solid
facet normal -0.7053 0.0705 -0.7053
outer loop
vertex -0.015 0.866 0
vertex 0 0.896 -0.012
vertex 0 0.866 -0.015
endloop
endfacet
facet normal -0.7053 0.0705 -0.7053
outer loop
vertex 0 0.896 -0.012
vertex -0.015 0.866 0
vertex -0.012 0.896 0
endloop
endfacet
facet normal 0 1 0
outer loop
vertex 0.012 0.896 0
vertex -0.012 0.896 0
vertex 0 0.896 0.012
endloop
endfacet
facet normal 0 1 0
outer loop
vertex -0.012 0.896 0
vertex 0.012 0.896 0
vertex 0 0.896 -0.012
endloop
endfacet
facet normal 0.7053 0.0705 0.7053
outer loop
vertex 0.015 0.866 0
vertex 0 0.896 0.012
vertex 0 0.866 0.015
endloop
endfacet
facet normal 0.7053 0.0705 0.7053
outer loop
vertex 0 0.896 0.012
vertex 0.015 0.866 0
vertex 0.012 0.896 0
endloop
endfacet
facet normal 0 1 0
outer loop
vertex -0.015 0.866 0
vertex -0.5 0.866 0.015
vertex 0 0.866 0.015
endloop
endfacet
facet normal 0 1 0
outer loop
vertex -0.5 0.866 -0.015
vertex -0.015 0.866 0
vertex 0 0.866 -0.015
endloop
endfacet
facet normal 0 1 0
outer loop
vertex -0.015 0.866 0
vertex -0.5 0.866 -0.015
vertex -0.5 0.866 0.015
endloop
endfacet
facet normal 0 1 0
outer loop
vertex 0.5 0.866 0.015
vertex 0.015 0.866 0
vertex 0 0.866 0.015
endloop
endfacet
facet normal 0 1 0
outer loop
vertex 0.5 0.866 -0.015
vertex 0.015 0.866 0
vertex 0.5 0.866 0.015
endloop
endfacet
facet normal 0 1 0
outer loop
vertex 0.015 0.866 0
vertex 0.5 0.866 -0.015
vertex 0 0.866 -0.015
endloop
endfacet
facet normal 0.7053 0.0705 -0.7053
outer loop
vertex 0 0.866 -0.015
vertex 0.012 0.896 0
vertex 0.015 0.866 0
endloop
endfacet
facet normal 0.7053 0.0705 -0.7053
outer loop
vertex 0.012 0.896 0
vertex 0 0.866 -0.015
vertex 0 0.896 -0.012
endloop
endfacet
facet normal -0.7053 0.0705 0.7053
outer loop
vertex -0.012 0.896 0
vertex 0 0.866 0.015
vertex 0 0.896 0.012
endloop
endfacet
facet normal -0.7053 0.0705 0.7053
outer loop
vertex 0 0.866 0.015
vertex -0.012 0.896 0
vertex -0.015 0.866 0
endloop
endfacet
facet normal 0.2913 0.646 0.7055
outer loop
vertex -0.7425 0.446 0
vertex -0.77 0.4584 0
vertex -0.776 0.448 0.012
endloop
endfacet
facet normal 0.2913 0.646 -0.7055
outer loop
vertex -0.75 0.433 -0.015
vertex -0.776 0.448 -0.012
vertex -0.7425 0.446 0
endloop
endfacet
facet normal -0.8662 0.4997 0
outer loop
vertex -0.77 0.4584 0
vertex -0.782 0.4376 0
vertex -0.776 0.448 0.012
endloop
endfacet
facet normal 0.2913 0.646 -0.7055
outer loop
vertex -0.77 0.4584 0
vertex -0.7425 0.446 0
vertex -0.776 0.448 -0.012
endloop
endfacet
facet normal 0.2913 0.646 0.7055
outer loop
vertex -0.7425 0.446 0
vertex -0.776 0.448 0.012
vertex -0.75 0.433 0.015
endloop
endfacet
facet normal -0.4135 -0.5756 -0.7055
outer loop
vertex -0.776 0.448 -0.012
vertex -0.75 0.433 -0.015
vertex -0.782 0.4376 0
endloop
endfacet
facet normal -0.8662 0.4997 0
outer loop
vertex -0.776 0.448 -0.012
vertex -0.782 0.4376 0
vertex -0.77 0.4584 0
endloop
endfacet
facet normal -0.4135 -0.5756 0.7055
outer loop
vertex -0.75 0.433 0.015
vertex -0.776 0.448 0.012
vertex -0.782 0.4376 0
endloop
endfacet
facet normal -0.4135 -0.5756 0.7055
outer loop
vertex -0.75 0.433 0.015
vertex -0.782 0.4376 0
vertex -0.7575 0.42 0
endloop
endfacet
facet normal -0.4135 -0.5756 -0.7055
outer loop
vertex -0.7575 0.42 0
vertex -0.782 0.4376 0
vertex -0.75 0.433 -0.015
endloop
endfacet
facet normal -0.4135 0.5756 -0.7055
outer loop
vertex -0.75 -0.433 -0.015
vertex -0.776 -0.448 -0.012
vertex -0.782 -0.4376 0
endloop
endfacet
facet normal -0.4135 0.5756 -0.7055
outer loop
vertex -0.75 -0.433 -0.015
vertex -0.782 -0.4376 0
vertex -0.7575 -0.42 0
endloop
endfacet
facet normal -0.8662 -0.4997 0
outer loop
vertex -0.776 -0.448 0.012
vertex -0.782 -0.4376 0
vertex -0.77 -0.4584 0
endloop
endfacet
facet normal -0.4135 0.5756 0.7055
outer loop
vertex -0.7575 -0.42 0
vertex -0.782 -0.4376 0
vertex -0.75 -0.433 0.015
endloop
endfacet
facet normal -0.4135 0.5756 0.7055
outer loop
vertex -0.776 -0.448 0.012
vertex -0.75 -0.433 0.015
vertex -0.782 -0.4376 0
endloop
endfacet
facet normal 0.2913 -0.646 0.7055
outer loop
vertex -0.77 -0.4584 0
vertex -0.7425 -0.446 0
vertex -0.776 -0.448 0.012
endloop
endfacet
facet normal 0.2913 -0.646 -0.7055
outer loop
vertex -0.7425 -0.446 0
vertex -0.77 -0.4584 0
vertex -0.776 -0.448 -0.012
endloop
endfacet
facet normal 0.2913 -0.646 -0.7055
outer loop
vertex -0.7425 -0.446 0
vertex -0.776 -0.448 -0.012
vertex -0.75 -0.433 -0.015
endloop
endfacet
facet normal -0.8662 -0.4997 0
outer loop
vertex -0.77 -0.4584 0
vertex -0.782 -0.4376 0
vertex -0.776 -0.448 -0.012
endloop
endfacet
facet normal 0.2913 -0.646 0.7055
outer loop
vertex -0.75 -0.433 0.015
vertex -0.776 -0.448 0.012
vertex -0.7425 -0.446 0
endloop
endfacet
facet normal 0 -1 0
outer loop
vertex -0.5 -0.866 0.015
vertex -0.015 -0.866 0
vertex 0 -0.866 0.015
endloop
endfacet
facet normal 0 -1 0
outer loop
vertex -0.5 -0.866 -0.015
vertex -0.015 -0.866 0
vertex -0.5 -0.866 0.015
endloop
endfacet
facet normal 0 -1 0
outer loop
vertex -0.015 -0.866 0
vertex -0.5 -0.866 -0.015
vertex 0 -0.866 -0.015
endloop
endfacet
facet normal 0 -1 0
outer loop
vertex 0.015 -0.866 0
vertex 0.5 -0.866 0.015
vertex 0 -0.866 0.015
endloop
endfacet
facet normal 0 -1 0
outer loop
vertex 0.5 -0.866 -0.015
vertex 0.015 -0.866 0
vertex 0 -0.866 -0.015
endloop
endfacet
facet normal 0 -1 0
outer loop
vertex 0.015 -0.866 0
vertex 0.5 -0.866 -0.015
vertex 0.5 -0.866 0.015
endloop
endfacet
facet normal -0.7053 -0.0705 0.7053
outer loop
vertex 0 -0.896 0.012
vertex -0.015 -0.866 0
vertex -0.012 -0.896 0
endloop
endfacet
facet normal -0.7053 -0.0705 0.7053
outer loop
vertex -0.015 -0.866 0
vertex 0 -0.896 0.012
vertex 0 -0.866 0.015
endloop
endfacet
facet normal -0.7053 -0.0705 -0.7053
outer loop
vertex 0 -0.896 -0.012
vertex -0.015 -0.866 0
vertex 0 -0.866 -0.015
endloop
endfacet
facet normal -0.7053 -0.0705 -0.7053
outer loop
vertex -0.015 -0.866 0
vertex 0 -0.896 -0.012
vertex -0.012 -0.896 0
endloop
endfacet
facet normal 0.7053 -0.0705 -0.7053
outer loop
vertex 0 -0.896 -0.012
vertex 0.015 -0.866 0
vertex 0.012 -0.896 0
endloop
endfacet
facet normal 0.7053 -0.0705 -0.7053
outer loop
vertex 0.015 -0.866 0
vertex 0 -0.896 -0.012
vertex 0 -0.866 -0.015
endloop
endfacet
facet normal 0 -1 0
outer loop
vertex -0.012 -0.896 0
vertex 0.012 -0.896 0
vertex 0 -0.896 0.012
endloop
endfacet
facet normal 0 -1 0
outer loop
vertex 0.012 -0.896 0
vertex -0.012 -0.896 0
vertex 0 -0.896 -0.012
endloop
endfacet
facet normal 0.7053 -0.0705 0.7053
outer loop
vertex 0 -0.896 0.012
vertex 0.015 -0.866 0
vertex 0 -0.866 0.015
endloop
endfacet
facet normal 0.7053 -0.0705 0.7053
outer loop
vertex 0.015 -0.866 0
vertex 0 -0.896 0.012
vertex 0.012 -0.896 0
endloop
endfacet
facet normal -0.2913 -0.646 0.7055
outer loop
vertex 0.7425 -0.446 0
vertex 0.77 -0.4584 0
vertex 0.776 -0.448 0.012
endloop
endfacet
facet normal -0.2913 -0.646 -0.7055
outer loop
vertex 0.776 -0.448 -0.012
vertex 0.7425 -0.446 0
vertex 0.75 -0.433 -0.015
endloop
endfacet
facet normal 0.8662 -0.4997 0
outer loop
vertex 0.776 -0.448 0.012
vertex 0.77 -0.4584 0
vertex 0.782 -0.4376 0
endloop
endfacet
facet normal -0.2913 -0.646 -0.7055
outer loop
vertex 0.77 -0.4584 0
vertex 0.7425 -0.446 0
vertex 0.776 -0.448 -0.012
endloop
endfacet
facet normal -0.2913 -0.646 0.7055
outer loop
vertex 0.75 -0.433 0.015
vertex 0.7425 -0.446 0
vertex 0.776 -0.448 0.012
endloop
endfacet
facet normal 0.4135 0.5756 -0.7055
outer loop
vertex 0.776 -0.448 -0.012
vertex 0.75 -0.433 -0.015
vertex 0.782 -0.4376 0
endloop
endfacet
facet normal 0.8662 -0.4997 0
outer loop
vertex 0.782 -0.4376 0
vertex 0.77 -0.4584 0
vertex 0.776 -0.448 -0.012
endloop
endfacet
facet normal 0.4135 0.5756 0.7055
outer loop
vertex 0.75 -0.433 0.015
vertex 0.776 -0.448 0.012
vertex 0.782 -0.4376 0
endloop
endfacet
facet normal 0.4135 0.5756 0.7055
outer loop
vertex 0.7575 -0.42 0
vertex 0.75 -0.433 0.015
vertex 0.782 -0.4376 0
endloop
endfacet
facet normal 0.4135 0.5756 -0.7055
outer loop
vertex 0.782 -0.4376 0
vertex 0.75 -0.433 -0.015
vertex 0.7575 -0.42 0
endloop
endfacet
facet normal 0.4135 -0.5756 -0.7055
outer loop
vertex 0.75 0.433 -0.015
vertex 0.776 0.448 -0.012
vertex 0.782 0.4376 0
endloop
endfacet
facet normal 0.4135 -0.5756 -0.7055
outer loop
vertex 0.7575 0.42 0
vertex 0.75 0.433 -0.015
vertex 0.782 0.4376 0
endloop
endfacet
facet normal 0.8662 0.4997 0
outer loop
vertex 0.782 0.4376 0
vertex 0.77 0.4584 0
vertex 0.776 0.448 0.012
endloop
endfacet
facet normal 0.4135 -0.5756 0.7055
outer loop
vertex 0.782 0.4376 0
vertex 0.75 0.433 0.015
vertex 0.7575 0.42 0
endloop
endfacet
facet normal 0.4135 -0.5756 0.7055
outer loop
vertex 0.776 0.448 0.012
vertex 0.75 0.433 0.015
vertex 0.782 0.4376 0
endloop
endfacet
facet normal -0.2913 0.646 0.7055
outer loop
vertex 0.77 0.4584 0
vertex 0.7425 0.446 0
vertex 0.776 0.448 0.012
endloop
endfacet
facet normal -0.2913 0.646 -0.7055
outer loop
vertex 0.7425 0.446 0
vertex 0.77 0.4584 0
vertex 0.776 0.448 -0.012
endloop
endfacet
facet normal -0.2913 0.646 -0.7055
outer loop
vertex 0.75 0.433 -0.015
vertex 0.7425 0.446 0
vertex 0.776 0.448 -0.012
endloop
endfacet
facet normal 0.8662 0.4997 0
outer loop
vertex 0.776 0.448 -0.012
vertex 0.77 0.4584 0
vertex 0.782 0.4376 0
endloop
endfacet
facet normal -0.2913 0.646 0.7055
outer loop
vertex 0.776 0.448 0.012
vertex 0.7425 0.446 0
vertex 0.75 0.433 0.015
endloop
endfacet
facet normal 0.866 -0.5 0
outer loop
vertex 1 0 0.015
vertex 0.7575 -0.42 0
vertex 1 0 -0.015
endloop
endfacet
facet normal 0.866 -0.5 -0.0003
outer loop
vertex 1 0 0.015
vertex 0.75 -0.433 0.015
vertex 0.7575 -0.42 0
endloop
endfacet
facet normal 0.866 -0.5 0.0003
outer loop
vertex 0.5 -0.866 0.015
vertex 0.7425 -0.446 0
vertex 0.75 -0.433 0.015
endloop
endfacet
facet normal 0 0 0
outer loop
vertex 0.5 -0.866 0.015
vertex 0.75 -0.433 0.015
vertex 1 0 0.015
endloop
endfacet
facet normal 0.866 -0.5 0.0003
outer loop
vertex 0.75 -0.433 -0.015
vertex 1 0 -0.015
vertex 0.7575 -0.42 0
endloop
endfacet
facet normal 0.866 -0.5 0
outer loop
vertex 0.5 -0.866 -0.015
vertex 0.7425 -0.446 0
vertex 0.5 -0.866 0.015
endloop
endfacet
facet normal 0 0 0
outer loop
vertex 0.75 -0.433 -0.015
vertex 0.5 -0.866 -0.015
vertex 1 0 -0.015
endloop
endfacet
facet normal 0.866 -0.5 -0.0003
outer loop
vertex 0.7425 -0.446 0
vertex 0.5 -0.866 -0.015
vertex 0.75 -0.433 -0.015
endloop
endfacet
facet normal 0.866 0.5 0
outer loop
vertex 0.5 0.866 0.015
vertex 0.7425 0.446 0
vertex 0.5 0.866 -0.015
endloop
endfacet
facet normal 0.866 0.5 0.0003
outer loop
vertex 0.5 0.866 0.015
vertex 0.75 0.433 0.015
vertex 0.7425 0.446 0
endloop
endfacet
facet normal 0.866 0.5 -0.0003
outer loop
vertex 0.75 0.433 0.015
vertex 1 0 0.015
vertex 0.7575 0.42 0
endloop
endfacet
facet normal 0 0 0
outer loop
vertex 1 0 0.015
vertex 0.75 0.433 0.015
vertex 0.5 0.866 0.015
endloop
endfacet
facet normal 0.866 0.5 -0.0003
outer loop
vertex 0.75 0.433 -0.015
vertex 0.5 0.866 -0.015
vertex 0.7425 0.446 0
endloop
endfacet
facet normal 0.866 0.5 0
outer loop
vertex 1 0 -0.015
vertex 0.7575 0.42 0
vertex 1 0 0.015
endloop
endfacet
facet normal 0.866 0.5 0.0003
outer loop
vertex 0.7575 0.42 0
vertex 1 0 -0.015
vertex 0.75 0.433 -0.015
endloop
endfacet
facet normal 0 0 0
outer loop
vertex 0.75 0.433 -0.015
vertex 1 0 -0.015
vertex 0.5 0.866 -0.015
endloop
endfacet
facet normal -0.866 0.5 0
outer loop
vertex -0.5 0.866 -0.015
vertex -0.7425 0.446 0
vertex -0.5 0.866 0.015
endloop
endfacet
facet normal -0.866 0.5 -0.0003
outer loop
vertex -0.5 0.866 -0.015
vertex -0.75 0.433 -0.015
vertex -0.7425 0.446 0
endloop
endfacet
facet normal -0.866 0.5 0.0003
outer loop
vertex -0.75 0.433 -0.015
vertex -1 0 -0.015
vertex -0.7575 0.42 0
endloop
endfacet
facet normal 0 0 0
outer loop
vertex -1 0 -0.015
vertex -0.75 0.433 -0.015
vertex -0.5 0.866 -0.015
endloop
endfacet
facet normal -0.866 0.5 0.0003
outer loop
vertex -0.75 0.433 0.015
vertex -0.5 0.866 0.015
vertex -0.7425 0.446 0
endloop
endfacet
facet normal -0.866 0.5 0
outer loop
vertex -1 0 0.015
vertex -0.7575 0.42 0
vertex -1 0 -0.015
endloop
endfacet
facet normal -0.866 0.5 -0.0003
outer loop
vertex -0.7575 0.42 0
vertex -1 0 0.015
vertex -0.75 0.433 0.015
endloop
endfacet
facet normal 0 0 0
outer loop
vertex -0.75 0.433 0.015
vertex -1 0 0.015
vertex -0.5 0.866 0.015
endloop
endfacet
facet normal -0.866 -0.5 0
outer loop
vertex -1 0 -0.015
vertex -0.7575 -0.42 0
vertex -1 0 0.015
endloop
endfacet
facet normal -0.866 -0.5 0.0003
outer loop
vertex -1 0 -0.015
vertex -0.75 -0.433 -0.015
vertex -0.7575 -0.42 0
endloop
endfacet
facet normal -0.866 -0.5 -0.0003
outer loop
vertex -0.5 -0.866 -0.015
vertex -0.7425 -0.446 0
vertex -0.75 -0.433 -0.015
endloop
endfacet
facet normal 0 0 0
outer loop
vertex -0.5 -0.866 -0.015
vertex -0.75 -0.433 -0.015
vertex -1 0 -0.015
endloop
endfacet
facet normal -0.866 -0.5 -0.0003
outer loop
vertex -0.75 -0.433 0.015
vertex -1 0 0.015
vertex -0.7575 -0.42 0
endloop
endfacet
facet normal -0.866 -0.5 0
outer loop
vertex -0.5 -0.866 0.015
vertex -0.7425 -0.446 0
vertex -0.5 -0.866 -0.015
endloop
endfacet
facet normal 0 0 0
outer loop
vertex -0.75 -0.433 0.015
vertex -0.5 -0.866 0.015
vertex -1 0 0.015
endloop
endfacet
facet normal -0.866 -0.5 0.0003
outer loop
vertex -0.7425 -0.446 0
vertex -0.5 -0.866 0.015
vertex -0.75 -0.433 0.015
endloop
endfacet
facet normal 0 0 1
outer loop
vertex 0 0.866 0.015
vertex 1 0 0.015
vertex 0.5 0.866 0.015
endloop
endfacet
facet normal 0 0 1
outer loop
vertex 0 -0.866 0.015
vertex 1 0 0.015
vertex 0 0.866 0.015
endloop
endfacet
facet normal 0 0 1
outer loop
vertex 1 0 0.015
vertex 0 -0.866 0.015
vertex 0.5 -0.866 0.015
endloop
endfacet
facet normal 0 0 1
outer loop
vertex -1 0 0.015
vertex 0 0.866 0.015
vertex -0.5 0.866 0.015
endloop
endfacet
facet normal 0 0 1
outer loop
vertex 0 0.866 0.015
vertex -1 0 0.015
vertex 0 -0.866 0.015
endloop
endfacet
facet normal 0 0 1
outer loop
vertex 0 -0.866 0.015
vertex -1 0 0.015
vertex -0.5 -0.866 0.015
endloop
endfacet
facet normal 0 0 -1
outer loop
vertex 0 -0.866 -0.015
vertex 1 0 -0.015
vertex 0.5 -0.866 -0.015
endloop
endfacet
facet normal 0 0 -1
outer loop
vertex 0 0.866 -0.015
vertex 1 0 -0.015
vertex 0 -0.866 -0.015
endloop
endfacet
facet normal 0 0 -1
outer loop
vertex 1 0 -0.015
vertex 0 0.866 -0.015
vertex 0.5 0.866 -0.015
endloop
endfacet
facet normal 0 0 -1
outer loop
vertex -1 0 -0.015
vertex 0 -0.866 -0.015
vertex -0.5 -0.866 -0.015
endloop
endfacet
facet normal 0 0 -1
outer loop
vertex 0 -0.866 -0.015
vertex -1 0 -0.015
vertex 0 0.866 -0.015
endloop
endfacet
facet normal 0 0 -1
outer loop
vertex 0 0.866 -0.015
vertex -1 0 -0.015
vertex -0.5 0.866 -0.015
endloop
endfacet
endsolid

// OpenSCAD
module hexagon_tile(R, H=0.03, R_side_grip=0.015, h_side_grip=0.03, h_center_grip=0, r_center_grip=0){
//translate([0,sin(60)*R+h_side_grip/2,0])    
// sin(60)*R+0.05/2 em y
union(){
//difference(){    
cylinder(h = H, r1 = R, r2 = R, center = true, $fn=6);
//translate([0,0,-H/2])
//cylinder(h = H, r1 = R-0.05, r2 = R-0.05, center = true, $fn=6);
//}
for (i = [1:6]){
    rotate([0,0,(i-1)*60])
    translate([0,cos(30)*R+h_side_grip/2,0])
    rotate([90,0,0])
    cylinder(h = h_side_grip, r1 = 0.8*R_side_grip, r2 = R_side_grip, center = true, $fn=4); 
}
translate([0,0,-(h_center_grip+H)/2])
cylinder(h = h_center_grip, r1 = r_center_grip, r2 = r_center_grip, center = true, $fn=6); 
}
}

hexagon_tile(R=1);
